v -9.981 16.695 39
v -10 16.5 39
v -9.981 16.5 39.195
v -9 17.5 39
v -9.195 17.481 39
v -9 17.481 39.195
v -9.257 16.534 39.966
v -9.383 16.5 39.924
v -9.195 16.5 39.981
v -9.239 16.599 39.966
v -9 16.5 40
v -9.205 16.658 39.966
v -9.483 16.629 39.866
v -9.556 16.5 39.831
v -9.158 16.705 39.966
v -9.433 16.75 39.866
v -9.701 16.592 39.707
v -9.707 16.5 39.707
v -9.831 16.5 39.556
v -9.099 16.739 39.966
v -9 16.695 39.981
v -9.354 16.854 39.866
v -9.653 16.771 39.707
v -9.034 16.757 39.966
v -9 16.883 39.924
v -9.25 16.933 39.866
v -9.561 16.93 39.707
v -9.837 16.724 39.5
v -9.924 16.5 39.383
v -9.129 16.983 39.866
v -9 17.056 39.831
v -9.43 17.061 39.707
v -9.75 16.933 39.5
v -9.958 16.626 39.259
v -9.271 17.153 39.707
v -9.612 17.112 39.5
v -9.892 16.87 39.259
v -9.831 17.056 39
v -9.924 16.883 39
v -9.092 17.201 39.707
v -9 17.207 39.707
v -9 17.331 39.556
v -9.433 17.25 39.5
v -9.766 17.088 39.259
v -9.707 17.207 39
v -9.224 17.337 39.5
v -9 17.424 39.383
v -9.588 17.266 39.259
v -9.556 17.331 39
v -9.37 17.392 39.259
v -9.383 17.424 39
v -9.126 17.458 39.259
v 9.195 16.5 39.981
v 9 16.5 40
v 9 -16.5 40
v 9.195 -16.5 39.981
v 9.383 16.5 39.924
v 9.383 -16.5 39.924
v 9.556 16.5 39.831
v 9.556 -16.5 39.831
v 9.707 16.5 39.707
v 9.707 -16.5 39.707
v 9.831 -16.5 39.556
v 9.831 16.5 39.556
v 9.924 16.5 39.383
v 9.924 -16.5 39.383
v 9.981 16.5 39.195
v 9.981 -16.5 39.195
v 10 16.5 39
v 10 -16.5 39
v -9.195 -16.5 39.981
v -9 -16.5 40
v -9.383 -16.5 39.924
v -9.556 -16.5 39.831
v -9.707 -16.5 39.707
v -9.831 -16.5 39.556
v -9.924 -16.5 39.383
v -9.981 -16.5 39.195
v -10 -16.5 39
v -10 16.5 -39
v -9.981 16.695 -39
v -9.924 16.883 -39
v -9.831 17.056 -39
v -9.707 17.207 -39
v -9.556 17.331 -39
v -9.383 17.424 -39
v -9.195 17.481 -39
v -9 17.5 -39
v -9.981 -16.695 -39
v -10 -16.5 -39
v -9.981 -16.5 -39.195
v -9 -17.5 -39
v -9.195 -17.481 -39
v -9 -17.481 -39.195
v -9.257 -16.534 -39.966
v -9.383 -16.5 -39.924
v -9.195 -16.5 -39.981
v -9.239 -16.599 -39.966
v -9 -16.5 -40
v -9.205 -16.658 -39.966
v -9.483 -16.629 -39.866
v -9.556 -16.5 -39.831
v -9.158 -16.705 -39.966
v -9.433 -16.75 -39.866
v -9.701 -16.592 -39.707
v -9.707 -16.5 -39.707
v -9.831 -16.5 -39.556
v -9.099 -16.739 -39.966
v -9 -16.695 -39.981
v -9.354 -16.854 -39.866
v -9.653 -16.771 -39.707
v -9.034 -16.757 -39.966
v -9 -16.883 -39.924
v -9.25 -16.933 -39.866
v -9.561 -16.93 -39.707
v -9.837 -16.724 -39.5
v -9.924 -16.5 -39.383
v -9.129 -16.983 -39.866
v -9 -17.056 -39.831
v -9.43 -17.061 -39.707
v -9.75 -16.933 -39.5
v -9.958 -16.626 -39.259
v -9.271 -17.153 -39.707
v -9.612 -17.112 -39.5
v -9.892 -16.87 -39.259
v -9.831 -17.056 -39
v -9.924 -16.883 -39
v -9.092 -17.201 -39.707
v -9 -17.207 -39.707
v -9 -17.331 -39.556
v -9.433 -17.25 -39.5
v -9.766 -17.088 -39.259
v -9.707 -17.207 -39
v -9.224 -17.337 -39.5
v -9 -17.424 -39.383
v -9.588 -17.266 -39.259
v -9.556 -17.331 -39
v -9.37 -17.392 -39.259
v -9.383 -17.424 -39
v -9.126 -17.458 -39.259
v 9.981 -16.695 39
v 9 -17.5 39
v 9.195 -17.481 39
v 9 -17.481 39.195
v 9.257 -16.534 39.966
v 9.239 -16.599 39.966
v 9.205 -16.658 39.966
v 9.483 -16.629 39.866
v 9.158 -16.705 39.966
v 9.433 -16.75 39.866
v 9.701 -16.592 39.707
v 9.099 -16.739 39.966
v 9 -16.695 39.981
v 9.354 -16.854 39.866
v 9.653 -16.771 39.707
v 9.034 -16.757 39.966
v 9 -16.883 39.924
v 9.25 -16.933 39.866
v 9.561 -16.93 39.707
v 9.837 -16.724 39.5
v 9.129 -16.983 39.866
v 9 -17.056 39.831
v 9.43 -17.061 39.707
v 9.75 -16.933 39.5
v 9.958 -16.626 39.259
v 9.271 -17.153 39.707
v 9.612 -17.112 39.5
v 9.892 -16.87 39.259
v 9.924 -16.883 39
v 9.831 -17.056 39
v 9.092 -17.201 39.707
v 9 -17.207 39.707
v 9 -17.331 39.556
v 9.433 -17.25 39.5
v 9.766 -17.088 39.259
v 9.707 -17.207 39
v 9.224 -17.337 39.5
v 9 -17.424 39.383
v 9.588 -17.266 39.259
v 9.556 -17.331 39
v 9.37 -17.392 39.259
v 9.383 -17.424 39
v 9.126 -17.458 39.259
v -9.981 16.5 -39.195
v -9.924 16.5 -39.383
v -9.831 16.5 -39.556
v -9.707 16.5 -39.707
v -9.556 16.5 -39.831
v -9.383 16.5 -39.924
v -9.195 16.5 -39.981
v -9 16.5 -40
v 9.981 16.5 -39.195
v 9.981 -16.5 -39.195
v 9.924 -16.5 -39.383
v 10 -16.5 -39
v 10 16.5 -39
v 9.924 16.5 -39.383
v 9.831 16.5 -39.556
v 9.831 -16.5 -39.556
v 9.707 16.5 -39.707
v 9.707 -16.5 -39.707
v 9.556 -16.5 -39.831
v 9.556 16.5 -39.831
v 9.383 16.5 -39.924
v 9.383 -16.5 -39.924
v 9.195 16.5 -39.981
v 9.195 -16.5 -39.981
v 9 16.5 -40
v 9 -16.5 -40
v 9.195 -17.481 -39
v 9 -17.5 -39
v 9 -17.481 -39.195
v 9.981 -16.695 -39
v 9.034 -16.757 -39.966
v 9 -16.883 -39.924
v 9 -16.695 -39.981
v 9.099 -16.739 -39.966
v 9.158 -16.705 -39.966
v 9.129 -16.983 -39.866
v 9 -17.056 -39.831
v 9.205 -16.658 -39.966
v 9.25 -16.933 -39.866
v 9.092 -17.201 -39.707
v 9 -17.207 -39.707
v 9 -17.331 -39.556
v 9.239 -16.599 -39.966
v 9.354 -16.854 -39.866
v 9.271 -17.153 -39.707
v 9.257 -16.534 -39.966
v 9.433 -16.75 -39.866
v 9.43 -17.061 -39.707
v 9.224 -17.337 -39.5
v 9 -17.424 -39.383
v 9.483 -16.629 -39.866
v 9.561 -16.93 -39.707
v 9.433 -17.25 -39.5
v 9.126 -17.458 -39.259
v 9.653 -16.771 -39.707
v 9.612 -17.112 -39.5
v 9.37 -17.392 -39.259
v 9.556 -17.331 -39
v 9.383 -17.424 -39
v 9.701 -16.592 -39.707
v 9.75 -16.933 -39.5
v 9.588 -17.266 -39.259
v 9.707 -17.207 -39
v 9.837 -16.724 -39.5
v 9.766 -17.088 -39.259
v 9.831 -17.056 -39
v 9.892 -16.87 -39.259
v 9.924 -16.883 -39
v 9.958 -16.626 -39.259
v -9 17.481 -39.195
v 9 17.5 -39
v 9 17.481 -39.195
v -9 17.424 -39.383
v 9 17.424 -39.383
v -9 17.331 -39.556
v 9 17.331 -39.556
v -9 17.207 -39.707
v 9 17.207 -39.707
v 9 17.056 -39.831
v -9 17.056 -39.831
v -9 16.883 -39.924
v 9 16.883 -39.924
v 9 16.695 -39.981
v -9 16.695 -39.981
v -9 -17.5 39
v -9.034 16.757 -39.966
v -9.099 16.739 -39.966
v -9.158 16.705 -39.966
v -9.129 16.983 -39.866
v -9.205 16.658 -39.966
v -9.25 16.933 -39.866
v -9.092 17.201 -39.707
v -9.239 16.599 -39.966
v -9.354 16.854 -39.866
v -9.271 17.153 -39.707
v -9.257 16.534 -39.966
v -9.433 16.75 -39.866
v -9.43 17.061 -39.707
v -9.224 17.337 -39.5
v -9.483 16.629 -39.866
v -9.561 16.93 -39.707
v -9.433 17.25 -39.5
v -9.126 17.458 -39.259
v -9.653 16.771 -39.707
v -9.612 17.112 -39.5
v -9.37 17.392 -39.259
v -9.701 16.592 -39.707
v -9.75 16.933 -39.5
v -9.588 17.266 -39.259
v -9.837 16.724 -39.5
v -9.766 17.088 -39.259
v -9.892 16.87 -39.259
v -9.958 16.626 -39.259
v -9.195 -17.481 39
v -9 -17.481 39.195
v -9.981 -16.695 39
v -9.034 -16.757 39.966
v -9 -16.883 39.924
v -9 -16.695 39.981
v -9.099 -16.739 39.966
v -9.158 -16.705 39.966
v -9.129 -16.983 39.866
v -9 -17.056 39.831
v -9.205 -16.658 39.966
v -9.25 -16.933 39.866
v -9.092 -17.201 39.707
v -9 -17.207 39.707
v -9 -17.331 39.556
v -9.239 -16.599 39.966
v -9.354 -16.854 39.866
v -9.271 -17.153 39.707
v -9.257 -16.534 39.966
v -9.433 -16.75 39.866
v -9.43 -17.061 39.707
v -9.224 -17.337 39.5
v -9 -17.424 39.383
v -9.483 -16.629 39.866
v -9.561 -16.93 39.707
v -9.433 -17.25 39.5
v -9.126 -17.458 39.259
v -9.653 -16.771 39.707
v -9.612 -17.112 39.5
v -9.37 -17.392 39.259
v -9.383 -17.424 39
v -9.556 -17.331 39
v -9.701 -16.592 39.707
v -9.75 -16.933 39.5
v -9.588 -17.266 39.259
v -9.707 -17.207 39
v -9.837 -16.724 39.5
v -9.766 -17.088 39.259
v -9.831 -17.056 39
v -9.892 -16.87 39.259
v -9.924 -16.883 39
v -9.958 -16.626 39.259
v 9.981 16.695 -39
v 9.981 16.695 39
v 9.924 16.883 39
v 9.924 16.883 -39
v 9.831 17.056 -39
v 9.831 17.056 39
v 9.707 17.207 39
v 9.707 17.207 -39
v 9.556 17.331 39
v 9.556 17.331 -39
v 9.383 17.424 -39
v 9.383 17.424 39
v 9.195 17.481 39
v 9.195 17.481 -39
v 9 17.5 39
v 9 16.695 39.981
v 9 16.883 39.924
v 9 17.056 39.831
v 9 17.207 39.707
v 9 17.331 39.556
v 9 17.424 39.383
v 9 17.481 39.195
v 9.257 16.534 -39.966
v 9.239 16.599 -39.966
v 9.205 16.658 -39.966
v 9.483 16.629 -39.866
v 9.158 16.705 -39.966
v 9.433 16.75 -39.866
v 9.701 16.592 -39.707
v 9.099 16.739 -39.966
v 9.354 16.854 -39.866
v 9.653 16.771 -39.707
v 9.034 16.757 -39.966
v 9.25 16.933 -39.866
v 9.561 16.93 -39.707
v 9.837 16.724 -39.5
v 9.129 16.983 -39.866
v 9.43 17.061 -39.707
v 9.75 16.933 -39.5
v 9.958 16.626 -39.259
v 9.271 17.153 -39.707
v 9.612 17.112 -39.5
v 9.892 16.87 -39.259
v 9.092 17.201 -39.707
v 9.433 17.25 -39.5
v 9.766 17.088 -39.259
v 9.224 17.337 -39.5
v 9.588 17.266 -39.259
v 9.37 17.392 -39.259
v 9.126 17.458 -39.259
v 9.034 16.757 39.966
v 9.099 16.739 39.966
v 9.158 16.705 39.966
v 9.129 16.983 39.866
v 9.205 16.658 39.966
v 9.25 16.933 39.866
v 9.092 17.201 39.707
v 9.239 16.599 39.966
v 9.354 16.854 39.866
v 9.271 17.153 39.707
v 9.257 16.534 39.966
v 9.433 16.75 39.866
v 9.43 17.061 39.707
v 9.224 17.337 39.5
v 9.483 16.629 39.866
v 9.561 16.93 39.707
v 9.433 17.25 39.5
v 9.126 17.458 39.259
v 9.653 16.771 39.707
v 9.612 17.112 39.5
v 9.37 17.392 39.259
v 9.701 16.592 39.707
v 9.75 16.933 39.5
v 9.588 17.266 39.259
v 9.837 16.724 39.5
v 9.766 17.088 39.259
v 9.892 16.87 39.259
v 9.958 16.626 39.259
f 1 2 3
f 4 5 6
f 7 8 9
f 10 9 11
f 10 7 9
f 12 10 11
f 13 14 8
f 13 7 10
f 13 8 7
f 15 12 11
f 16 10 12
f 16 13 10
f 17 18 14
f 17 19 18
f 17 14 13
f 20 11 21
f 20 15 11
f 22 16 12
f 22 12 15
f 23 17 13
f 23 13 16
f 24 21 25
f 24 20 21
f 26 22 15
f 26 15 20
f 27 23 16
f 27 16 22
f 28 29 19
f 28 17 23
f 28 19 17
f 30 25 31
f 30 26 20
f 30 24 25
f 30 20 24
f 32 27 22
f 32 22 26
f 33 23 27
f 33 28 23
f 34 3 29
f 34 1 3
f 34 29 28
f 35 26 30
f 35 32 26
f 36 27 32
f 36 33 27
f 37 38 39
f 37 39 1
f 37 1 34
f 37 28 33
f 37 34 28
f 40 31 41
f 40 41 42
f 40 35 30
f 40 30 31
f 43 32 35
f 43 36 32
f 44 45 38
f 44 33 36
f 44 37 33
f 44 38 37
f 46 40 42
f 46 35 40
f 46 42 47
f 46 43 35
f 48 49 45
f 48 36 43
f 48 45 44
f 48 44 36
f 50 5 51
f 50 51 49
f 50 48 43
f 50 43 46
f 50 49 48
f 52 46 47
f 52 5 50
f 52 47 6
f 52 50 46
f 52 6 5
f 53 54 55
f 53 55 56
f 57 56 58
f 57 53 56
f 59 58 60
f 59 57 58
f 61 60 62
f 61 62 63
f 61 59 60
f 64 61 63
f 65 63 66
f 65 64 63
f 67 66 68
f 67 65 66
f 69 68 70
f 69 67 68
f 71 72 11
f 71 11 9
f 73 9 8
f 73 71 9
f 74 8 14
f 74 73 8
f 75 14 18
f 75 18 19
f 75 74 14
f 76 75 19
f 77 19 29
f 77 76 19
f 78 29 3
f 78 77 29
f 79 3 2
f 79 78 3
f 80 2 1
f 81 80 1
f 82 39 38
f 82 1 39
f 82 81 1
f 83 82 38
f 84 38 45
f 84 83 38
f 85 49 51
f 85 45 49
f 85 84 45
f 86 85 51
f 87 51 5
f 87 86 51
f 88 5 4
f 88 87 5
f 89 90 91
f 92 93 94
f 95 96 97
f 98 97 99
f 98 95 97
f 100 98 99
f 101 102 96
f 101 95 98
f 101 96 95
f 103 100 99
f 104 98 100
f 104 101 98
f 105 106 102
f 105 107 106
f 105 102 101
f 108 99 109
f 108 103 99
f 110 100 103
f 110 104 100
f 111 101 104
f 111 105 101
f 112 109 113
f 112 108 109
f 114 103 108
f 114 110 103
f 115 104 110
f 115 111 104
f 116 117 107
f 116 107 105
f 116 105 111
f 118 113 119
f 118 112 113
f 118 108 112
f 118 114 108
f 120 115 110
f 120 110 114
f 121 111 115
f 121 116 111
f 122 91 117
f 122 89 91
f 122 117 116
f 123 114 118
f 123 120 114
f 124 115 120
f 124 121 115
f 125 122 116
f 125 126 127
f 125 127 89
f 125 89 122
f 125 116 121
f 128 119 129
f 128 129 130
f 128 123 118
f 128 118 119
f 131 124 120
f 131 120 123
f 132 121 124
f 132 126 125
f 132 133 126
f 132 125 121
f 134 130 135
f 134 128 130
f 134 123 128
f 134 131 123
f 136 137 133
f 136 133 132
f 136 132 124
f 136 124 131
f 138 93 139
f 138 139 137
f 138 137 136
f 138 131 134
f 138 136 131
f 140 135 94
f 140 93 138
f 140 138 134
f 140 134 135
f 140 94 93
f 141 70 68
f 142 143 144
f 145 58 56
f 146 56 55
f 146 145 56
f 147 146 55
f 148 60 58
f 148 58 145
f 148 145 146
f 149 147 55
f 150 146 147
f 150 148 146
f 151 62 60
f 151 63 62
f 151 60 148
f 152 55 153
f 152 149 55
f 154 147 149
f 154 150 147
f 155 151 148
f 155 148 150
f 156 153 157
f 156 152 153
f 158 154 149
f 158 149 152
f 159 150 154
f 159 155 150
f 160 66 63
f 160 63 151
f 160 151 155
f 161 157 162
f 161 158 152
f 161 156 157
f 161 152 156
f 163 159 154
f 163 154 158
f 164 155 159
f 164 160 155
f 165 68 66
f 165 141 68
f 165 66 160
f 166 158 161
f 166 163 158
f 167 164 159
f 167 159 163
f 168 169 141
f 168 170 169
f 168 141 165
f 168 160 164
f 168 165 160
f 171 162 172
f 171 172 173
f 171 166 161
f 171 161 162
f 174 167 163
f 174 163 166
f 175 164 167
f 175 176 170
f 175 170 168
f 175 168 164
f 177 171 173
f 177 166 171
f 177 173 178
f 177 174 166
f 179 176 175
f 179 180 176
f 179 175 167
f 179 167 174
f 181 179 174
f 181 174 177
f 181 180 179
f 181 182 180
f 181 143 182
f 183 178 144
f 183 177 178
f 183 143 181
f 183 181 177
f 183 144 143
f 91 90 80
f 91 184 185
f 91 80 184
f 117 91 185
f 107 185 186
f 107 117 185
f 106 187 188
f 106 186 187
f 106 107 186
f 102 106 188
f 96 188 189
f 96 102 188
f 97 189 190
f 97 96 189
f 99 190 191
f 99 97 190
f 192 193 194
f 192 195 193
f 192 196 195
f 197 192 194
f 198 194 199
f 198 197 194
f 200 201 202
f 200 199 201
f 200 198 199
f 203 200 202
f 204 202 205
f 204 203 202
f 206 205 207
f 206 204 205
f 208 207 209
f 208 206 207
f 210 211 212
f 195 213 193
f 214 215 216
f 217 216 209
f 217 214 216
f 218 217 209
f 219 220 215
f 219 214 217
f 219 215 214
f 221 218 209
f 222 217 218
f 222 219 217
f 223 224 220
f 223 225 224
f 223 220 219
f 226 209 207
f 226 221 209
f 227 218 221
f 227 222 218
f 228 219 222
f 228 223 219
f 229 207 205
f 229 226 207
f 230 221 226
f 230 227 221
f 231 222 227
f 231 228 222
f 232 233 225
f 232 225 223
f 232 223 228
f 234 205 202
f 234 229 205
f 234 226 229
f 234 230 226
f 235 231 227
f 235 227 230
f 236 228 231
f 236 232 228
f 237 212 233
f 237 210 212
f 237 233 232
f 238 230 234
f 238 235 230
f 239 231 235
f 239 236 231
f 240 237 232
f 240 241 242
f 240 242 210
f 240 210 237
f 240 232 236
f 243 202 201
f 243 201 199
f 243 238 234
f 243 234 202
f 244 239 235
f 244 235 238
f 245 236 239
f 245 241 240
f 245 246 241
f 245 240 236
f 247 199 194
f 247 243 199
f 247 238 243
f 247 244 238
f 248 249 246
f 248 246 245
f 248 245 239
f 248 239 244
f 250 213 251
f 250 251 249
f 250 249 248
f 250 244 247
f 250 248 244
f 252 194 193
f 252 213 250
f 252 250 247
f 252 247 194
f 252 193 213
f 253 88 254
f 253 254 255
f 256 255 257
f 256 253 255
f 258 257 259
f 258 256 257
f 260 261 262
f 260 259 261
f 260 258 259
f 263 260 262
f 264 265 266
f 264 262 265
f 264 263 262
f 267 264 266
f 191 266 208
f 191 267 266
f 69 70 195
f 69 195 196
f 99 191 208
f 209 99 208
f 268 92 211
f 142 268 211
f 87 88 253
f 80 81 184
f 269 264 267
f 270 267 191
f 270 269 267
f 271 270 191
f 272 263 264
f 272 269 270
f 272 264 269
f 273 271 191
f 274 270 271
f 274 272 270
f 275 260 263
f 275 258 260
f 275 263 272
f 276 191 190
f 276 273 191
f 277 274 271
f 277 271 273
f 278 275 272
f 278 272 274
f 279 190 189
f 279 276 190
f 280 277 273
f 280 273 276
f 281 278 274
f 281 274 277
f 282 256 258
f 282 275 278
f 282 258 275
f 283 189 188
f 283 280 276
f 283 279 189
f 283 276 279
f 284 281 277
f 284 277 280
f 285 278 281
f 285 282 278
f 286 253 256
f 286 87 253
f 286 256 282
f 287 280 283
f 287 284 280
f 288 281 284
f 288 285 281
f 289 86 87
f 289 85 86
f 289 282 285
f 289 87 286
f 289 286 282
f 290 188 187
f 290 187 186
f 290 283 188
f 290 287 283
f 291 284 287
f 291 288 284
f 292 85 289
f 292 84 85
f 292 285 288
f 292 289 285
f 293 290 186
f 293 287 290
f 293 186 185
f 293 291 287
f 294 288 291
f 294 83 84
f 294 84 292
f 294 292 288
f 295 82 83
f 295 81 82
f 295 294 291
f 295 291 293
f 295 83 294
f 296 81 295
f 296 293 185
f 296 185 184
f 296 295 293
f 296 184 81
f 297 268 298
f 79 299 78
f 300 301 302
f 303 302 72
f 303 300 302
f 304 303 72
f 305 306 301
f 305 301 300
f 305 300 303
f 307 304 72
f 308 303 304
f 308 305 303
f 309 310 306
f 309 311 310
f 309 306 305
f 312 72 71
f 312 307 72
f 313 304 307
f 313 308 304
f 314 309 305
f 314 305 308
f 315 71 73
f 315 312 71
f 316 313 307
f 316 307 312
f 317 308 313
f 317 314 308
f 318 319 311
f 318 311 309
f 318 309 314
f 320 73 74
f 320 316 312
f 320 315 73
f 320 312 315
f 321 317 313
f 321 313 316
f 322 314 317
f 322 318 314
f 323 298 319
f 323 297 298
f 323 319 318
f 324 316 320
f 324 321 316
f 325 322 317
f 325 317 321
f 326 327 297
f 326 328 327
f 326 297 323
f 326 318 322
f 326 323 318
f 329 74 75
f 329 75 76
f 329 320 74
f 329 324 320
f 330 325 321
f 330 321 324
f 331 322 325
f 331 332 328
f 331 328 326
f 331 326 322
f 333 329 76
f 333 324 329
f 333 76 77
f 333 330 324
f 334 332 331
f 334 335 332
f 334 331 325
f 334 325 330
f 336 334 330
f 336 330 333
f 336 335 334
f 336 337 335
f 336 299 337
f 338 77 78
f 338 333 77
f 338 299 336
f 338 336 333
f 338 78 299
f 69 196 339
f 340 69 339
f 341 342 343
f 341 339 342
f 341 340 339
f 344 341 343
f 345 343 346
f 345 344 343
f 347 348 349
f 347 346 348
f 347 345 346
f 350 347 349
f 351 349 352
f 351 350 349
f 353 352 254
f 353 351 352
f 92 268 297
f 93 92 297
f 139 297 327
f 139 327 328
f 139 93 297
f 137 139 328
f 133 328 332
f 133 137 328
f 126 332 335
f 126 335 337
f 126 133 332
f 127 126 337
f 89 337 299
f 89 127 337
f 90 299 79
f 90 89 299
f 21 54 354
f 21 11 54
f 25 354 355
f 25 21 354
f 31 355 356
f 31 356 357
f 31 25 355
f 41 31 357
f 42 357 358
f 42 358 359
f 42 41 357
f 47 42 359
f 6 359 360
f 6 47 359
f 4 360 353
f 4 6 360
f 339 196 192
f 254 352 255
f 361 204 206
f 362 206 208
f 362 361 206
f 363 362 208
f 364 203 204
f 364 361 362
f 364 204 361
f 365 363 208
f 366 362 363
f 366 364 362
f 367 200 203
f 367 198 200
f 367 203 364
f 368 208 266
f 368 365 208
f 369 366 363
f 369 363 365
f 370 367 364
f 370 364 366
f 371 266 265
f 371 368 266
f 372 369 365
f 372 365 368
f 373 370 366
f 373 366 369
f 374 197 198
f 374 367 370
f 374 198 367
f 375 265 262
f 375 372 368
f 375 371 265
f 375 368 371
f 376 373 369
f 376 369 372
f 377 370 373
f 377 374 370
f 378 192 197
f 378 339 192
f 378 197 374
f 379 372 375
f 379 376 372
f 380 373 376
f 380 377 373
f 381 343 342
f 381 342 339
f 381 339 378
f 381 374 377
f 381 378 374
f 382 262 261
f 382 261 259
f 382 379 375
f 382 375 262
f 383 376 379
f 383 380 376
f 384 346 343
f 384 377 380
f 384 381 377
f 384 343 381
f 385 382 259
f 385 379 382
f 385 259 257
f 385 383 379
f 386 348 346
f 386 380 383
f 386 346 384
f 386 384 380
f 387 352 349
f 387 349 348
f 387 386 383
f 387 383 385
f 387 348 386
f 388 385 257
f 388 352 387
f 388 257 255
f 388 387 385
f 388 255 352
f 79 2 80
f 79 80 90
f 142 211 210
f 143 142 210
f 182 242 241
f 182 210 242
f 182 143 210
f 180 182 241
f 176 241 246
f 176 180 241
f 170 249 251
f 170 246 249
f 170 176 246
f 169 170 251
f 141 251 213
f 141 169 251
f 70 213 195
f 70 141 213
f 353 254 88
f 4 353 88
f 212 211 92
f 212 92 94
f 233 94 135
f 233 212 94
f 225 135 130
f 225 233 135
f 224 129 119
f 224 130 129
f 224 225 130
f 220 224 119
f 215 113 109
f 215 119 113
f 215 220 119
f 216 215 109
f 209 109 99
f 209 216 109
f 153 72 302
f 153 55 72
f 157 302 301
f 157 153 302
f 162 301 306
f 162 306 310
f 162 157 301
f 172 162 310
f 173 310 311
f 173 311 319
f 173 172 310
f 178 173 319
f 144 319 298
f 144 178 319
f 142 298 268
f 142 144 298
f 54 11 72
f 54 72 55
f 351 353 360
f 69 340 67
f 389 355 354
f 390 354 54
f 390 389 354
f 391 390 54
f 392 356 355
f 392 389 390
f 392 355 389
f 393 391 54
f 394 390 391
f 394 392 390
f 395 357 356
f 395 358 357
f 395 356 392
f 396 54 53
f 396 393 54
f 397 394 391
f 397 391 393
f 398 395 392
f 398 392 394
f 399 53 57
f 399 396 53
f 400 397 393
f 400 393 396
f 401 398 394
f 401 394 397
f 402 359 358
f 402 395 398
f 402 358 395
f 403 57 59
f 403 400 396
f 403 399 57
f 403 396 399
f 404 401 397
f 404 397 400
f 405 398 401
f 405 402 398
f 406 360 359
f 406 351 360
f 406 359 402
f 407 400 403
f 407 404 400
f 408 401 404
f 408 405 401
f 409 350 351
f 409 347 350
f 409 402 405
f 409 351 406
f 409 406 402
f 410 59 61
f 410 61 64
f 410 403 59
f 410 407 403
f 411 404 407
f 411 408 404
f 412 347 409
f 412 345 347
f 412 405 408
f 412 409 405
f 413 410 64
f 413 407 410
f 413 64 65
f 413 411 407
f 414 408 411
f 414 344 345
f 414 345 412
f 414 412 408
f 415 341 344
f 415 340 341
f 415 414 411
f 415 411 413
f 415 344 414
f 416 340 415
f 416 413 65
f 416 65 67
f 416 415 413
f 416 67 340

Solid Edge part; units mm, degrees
sketch "Sketch1" plane through (0, 0, 0) normal (0, 0, 1) x (1, 0, 0)
  line L0 (-10, -17.5) -> (10, -17.5)
  line L1 (10, -17.5) -> (10, 17.5)
  line L2 (10, 17.5) -> (-10, 17.5)
  line L3 (-10, 17.5) -> (-10, -17.5)
  dimension "D1" = 35
  dimension "D2" = 20
extrude "Protrusion1" add sketch "Sketch1" along normal mid plane 80
fillet "Round_1" radius 1 12 edges at (-10, -17.5, 0) (10, -17.5, 0) (10, 17.5, 0) (-10, 17.5, 0) (0, 17.5, 40) (10, 0, 40) (0, -17.5, 40) (-10, 0, 40) (0, 17.5, -40) (10, 0, -40) (0, -17.5, -40) (-10, 0, -40)
properties material "Aluminum, 1060"
